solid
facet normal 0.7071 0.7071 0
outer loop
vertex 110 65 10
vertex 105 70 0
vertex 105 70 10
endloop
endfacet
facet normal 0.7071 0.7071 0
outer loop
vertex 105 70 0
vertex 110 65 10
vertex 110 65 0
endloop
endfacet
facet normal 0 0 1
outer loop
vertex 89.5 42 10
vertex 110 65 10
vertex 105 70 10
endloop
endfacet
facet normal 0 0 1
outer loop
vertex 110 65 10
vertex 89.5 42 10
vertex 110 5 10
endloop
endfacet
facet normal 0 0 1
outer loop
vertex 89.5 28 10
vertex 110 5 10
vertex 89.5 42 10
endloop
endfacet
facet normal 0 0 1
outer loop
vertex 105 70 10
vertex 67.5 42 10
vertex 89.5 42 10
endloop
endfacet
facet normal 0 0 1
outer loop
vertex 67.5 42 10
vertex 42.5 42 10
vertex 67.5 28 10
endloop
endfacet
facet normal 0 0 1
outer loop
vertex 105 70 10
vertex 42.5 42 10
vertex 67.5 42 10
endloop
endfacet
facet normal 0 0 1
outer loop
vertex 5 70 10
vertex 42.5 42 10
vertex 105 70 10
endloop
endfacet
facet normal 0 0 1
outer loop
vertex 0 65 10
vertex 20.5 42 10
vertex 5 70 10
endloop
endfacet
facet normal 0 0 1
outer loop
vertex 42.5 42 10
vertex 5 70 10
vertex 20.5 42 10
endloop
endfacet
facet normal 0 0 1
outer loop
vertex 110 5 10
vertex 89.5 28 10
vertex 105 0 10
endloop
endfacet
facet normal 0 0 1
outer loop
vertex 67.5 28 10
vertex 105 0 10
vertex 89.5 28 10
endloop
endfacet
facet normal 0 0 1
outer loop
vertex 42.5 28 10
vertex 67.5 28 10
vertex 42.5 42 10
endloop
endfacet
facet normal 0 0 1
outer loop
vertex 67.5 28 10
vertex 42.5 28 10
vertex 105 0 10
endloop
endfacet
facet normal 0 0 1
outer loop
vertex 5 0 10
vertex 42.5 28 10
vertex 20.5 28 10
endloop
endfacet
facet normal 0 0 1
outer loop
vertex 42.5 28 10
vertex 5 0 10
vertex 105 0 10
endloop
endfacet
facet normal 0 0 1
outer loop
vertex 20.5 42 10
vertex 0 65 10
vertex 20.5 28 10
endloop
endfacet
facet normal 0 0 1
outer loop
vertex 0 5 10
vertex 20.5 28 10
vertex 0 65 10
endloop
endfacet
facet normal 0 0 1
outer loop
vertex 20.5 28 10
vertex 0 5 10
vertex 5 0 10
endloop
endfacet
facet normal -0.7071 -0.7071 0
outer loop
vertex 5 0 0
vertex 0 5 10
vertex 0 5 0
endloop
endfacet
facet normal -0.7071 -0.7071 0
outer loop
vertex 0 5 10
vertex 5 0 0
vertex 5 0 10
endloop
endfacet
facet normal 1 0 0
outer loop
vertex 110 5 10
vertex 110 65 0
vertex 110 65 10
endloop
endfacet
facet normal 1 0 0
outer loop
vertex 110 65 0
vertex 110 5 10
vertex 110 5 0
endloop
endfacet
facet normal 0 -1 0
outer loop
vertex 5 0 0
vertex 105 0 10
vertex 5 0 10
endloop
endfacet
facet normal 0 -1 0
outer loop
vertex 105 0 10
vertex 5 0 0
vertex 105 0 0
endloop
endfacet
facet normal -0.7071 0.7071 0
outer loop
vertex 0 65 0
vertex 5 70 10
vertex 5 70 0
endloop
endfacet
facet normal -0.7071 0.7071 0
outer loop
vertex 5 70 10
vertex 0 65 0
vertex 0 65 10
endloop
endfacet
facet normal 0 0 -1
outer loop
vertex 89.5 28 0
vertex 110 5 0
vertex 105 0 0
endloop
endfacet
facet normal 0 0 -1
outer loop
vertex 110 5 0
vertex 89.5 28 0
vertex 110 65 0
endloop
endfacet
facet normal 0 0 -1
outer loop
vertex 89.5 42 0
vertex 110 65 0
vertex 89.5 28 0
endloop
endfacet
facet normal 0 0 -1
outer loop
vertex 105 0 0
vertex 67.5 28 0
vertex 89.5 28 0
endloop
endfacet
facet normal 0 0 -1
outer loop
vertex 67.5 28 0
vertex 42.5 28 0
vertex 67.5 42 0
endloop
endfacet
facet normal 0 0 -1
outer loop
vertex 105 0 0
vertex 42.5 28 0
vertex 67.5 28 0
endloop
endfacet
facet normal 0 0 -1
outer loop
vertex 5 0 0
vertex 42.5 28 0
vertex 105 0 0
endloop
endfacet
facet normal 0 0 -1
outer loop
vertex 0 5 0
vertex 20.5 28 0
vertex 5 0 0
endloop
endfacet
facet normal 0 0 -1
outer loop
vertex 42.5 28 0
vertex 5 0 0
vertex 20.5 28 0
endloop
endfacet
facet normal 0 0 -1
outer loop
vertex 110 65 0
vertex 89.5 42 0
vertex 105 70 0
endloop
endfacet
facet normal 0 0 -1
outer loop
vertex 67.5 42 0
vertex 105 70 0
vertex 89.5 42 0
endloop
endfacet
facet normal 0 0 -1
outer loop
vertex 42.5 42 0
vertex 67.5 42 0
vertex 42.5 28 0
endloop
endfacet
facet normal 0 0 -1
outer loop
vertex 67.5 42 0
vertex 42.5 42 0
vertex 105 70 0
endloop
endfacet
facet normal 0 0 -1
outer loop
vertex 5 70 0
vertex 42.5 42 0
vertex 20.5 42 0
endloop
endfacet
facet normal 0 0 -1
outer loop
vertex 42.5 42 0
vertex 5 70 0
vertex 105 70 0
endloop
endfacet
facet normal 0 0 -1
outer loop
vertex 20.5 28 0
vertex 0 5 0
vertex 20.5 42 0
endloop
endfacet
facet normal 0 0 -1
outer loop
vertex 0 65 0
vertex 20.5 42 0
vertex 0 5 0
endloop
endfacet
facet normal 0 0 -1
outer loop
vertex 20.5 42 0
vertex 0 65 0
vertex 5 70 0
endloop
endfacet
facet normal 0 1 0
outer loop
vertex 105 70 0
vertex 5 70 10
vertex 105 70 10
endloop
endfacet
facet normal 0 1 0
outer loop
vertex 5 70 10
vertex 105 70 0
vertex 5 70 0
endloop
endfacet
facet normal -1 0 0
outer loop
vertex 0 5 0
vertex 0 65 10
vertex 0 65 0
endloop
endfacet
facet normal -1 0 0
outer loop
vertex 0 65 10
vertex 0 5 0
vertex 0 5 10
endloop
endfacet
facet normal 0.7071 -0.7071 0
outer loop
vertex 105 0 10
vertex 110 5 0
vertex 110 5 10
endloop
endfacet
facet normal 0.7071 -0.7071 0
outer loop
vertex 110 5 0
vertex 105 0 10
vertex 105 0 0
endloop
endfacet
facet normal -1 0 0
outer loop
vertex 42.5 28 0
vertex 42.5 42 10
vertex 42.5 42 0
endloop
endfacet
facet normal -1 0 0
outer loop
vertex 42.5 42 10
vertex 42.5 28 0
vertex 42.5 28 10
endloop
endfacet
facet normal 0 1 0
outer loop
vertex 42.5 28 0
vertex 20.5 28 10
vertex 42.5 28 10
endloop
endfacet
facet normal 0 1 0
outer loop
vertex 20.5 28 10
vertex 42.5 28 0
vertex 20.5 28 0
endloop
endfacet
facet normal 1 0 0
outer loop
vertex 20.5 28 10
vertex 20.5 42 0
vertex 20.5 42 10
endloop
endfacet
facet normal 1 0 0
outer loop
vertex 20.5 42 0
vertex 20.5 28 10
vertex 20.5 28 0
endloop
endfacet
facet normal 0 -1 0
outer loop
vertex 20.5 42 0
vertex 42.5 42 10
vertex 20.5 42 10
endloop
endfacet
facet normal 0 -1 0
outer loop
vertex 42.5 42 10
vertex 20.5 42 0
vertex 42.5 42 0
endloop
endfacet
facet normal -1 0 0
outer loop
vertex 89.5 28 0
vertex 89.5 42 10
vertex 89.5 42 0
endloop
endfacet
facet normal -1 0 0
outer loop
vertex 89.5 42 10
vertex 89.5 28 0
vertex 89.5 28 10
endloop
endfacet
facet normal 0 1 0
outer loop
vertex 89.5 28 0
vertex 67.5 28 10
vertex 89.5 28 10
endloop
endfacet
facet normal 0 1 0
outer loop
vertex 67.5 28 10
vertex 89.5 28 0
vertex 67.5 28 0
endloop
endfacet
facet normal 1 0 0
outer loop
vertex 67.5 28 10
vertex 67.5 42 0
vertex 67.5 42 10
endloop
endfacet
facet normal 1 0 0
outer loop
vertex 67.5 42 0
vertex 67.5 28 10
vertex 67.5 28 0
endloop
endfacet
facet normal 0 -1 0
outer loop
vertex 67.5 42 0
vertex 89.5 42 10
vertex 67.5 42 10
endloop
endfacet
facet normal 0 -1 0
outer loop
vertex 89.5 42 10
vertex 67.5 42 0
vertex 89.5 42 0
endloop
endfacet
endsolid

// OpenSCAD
$fn = 32;

// ----------------------------------------------------------------------
// Windowed plate: 2 voids, 110 x 70 x 10 mm
// ----------------------------------------------------------------------

// --- parameters (mm) ---
plate_l = 110;            // plate length, X
plate_w = 70;             // plate width, Y
plate_t = 10;             // plate thickness, Z
edge_margin = 8;          // wall from the plate edge to any window
windows = 2;              // number of windows in the row
win_l = 22;               // window length
win_w = 14;               // window width
win_pitch = 47;           // window pitch along X
depth_1 = 10;             // depth of void 1 (full thickness = through)
depth_2 = 10;             // depth of void 2 (full thickness = through)
corner_c = 5;             // corner chamfer of the plate
fit_tol = 0.05;           // declared fit tolerance (prompt contract)
free_tol = 0.3;           // declared free tolerance (prompt contract)

profile = [[5, 0], [105, 0], [110, 5], [110, 65], [105, 70], [5, 70], [0, 65], [0, 5]];  // primary outline, 8 points, counter clockwise
void_1 = [[20.5, 28], [42.5, 28], [42.5, 42], [20.5, 42]];  // window 1 of the row, 4 points
void_2 = [[67.5, 28], [89.5, 28], [89.5, 42], [67.5, 42]];  // window 2 of the row, 4 points

// --- the one profile operation ---
difference() {
  linear_extrude(height = plate_t) polygon(points = profile);
  translate([0, 0, -1])
    linear_extrude(height = plate_t + 2) polygon(points = void_1);
  translate([0, 0, -1])
    linear_extrude(height = plate_t + 2) polygon(points = void_2);
}
